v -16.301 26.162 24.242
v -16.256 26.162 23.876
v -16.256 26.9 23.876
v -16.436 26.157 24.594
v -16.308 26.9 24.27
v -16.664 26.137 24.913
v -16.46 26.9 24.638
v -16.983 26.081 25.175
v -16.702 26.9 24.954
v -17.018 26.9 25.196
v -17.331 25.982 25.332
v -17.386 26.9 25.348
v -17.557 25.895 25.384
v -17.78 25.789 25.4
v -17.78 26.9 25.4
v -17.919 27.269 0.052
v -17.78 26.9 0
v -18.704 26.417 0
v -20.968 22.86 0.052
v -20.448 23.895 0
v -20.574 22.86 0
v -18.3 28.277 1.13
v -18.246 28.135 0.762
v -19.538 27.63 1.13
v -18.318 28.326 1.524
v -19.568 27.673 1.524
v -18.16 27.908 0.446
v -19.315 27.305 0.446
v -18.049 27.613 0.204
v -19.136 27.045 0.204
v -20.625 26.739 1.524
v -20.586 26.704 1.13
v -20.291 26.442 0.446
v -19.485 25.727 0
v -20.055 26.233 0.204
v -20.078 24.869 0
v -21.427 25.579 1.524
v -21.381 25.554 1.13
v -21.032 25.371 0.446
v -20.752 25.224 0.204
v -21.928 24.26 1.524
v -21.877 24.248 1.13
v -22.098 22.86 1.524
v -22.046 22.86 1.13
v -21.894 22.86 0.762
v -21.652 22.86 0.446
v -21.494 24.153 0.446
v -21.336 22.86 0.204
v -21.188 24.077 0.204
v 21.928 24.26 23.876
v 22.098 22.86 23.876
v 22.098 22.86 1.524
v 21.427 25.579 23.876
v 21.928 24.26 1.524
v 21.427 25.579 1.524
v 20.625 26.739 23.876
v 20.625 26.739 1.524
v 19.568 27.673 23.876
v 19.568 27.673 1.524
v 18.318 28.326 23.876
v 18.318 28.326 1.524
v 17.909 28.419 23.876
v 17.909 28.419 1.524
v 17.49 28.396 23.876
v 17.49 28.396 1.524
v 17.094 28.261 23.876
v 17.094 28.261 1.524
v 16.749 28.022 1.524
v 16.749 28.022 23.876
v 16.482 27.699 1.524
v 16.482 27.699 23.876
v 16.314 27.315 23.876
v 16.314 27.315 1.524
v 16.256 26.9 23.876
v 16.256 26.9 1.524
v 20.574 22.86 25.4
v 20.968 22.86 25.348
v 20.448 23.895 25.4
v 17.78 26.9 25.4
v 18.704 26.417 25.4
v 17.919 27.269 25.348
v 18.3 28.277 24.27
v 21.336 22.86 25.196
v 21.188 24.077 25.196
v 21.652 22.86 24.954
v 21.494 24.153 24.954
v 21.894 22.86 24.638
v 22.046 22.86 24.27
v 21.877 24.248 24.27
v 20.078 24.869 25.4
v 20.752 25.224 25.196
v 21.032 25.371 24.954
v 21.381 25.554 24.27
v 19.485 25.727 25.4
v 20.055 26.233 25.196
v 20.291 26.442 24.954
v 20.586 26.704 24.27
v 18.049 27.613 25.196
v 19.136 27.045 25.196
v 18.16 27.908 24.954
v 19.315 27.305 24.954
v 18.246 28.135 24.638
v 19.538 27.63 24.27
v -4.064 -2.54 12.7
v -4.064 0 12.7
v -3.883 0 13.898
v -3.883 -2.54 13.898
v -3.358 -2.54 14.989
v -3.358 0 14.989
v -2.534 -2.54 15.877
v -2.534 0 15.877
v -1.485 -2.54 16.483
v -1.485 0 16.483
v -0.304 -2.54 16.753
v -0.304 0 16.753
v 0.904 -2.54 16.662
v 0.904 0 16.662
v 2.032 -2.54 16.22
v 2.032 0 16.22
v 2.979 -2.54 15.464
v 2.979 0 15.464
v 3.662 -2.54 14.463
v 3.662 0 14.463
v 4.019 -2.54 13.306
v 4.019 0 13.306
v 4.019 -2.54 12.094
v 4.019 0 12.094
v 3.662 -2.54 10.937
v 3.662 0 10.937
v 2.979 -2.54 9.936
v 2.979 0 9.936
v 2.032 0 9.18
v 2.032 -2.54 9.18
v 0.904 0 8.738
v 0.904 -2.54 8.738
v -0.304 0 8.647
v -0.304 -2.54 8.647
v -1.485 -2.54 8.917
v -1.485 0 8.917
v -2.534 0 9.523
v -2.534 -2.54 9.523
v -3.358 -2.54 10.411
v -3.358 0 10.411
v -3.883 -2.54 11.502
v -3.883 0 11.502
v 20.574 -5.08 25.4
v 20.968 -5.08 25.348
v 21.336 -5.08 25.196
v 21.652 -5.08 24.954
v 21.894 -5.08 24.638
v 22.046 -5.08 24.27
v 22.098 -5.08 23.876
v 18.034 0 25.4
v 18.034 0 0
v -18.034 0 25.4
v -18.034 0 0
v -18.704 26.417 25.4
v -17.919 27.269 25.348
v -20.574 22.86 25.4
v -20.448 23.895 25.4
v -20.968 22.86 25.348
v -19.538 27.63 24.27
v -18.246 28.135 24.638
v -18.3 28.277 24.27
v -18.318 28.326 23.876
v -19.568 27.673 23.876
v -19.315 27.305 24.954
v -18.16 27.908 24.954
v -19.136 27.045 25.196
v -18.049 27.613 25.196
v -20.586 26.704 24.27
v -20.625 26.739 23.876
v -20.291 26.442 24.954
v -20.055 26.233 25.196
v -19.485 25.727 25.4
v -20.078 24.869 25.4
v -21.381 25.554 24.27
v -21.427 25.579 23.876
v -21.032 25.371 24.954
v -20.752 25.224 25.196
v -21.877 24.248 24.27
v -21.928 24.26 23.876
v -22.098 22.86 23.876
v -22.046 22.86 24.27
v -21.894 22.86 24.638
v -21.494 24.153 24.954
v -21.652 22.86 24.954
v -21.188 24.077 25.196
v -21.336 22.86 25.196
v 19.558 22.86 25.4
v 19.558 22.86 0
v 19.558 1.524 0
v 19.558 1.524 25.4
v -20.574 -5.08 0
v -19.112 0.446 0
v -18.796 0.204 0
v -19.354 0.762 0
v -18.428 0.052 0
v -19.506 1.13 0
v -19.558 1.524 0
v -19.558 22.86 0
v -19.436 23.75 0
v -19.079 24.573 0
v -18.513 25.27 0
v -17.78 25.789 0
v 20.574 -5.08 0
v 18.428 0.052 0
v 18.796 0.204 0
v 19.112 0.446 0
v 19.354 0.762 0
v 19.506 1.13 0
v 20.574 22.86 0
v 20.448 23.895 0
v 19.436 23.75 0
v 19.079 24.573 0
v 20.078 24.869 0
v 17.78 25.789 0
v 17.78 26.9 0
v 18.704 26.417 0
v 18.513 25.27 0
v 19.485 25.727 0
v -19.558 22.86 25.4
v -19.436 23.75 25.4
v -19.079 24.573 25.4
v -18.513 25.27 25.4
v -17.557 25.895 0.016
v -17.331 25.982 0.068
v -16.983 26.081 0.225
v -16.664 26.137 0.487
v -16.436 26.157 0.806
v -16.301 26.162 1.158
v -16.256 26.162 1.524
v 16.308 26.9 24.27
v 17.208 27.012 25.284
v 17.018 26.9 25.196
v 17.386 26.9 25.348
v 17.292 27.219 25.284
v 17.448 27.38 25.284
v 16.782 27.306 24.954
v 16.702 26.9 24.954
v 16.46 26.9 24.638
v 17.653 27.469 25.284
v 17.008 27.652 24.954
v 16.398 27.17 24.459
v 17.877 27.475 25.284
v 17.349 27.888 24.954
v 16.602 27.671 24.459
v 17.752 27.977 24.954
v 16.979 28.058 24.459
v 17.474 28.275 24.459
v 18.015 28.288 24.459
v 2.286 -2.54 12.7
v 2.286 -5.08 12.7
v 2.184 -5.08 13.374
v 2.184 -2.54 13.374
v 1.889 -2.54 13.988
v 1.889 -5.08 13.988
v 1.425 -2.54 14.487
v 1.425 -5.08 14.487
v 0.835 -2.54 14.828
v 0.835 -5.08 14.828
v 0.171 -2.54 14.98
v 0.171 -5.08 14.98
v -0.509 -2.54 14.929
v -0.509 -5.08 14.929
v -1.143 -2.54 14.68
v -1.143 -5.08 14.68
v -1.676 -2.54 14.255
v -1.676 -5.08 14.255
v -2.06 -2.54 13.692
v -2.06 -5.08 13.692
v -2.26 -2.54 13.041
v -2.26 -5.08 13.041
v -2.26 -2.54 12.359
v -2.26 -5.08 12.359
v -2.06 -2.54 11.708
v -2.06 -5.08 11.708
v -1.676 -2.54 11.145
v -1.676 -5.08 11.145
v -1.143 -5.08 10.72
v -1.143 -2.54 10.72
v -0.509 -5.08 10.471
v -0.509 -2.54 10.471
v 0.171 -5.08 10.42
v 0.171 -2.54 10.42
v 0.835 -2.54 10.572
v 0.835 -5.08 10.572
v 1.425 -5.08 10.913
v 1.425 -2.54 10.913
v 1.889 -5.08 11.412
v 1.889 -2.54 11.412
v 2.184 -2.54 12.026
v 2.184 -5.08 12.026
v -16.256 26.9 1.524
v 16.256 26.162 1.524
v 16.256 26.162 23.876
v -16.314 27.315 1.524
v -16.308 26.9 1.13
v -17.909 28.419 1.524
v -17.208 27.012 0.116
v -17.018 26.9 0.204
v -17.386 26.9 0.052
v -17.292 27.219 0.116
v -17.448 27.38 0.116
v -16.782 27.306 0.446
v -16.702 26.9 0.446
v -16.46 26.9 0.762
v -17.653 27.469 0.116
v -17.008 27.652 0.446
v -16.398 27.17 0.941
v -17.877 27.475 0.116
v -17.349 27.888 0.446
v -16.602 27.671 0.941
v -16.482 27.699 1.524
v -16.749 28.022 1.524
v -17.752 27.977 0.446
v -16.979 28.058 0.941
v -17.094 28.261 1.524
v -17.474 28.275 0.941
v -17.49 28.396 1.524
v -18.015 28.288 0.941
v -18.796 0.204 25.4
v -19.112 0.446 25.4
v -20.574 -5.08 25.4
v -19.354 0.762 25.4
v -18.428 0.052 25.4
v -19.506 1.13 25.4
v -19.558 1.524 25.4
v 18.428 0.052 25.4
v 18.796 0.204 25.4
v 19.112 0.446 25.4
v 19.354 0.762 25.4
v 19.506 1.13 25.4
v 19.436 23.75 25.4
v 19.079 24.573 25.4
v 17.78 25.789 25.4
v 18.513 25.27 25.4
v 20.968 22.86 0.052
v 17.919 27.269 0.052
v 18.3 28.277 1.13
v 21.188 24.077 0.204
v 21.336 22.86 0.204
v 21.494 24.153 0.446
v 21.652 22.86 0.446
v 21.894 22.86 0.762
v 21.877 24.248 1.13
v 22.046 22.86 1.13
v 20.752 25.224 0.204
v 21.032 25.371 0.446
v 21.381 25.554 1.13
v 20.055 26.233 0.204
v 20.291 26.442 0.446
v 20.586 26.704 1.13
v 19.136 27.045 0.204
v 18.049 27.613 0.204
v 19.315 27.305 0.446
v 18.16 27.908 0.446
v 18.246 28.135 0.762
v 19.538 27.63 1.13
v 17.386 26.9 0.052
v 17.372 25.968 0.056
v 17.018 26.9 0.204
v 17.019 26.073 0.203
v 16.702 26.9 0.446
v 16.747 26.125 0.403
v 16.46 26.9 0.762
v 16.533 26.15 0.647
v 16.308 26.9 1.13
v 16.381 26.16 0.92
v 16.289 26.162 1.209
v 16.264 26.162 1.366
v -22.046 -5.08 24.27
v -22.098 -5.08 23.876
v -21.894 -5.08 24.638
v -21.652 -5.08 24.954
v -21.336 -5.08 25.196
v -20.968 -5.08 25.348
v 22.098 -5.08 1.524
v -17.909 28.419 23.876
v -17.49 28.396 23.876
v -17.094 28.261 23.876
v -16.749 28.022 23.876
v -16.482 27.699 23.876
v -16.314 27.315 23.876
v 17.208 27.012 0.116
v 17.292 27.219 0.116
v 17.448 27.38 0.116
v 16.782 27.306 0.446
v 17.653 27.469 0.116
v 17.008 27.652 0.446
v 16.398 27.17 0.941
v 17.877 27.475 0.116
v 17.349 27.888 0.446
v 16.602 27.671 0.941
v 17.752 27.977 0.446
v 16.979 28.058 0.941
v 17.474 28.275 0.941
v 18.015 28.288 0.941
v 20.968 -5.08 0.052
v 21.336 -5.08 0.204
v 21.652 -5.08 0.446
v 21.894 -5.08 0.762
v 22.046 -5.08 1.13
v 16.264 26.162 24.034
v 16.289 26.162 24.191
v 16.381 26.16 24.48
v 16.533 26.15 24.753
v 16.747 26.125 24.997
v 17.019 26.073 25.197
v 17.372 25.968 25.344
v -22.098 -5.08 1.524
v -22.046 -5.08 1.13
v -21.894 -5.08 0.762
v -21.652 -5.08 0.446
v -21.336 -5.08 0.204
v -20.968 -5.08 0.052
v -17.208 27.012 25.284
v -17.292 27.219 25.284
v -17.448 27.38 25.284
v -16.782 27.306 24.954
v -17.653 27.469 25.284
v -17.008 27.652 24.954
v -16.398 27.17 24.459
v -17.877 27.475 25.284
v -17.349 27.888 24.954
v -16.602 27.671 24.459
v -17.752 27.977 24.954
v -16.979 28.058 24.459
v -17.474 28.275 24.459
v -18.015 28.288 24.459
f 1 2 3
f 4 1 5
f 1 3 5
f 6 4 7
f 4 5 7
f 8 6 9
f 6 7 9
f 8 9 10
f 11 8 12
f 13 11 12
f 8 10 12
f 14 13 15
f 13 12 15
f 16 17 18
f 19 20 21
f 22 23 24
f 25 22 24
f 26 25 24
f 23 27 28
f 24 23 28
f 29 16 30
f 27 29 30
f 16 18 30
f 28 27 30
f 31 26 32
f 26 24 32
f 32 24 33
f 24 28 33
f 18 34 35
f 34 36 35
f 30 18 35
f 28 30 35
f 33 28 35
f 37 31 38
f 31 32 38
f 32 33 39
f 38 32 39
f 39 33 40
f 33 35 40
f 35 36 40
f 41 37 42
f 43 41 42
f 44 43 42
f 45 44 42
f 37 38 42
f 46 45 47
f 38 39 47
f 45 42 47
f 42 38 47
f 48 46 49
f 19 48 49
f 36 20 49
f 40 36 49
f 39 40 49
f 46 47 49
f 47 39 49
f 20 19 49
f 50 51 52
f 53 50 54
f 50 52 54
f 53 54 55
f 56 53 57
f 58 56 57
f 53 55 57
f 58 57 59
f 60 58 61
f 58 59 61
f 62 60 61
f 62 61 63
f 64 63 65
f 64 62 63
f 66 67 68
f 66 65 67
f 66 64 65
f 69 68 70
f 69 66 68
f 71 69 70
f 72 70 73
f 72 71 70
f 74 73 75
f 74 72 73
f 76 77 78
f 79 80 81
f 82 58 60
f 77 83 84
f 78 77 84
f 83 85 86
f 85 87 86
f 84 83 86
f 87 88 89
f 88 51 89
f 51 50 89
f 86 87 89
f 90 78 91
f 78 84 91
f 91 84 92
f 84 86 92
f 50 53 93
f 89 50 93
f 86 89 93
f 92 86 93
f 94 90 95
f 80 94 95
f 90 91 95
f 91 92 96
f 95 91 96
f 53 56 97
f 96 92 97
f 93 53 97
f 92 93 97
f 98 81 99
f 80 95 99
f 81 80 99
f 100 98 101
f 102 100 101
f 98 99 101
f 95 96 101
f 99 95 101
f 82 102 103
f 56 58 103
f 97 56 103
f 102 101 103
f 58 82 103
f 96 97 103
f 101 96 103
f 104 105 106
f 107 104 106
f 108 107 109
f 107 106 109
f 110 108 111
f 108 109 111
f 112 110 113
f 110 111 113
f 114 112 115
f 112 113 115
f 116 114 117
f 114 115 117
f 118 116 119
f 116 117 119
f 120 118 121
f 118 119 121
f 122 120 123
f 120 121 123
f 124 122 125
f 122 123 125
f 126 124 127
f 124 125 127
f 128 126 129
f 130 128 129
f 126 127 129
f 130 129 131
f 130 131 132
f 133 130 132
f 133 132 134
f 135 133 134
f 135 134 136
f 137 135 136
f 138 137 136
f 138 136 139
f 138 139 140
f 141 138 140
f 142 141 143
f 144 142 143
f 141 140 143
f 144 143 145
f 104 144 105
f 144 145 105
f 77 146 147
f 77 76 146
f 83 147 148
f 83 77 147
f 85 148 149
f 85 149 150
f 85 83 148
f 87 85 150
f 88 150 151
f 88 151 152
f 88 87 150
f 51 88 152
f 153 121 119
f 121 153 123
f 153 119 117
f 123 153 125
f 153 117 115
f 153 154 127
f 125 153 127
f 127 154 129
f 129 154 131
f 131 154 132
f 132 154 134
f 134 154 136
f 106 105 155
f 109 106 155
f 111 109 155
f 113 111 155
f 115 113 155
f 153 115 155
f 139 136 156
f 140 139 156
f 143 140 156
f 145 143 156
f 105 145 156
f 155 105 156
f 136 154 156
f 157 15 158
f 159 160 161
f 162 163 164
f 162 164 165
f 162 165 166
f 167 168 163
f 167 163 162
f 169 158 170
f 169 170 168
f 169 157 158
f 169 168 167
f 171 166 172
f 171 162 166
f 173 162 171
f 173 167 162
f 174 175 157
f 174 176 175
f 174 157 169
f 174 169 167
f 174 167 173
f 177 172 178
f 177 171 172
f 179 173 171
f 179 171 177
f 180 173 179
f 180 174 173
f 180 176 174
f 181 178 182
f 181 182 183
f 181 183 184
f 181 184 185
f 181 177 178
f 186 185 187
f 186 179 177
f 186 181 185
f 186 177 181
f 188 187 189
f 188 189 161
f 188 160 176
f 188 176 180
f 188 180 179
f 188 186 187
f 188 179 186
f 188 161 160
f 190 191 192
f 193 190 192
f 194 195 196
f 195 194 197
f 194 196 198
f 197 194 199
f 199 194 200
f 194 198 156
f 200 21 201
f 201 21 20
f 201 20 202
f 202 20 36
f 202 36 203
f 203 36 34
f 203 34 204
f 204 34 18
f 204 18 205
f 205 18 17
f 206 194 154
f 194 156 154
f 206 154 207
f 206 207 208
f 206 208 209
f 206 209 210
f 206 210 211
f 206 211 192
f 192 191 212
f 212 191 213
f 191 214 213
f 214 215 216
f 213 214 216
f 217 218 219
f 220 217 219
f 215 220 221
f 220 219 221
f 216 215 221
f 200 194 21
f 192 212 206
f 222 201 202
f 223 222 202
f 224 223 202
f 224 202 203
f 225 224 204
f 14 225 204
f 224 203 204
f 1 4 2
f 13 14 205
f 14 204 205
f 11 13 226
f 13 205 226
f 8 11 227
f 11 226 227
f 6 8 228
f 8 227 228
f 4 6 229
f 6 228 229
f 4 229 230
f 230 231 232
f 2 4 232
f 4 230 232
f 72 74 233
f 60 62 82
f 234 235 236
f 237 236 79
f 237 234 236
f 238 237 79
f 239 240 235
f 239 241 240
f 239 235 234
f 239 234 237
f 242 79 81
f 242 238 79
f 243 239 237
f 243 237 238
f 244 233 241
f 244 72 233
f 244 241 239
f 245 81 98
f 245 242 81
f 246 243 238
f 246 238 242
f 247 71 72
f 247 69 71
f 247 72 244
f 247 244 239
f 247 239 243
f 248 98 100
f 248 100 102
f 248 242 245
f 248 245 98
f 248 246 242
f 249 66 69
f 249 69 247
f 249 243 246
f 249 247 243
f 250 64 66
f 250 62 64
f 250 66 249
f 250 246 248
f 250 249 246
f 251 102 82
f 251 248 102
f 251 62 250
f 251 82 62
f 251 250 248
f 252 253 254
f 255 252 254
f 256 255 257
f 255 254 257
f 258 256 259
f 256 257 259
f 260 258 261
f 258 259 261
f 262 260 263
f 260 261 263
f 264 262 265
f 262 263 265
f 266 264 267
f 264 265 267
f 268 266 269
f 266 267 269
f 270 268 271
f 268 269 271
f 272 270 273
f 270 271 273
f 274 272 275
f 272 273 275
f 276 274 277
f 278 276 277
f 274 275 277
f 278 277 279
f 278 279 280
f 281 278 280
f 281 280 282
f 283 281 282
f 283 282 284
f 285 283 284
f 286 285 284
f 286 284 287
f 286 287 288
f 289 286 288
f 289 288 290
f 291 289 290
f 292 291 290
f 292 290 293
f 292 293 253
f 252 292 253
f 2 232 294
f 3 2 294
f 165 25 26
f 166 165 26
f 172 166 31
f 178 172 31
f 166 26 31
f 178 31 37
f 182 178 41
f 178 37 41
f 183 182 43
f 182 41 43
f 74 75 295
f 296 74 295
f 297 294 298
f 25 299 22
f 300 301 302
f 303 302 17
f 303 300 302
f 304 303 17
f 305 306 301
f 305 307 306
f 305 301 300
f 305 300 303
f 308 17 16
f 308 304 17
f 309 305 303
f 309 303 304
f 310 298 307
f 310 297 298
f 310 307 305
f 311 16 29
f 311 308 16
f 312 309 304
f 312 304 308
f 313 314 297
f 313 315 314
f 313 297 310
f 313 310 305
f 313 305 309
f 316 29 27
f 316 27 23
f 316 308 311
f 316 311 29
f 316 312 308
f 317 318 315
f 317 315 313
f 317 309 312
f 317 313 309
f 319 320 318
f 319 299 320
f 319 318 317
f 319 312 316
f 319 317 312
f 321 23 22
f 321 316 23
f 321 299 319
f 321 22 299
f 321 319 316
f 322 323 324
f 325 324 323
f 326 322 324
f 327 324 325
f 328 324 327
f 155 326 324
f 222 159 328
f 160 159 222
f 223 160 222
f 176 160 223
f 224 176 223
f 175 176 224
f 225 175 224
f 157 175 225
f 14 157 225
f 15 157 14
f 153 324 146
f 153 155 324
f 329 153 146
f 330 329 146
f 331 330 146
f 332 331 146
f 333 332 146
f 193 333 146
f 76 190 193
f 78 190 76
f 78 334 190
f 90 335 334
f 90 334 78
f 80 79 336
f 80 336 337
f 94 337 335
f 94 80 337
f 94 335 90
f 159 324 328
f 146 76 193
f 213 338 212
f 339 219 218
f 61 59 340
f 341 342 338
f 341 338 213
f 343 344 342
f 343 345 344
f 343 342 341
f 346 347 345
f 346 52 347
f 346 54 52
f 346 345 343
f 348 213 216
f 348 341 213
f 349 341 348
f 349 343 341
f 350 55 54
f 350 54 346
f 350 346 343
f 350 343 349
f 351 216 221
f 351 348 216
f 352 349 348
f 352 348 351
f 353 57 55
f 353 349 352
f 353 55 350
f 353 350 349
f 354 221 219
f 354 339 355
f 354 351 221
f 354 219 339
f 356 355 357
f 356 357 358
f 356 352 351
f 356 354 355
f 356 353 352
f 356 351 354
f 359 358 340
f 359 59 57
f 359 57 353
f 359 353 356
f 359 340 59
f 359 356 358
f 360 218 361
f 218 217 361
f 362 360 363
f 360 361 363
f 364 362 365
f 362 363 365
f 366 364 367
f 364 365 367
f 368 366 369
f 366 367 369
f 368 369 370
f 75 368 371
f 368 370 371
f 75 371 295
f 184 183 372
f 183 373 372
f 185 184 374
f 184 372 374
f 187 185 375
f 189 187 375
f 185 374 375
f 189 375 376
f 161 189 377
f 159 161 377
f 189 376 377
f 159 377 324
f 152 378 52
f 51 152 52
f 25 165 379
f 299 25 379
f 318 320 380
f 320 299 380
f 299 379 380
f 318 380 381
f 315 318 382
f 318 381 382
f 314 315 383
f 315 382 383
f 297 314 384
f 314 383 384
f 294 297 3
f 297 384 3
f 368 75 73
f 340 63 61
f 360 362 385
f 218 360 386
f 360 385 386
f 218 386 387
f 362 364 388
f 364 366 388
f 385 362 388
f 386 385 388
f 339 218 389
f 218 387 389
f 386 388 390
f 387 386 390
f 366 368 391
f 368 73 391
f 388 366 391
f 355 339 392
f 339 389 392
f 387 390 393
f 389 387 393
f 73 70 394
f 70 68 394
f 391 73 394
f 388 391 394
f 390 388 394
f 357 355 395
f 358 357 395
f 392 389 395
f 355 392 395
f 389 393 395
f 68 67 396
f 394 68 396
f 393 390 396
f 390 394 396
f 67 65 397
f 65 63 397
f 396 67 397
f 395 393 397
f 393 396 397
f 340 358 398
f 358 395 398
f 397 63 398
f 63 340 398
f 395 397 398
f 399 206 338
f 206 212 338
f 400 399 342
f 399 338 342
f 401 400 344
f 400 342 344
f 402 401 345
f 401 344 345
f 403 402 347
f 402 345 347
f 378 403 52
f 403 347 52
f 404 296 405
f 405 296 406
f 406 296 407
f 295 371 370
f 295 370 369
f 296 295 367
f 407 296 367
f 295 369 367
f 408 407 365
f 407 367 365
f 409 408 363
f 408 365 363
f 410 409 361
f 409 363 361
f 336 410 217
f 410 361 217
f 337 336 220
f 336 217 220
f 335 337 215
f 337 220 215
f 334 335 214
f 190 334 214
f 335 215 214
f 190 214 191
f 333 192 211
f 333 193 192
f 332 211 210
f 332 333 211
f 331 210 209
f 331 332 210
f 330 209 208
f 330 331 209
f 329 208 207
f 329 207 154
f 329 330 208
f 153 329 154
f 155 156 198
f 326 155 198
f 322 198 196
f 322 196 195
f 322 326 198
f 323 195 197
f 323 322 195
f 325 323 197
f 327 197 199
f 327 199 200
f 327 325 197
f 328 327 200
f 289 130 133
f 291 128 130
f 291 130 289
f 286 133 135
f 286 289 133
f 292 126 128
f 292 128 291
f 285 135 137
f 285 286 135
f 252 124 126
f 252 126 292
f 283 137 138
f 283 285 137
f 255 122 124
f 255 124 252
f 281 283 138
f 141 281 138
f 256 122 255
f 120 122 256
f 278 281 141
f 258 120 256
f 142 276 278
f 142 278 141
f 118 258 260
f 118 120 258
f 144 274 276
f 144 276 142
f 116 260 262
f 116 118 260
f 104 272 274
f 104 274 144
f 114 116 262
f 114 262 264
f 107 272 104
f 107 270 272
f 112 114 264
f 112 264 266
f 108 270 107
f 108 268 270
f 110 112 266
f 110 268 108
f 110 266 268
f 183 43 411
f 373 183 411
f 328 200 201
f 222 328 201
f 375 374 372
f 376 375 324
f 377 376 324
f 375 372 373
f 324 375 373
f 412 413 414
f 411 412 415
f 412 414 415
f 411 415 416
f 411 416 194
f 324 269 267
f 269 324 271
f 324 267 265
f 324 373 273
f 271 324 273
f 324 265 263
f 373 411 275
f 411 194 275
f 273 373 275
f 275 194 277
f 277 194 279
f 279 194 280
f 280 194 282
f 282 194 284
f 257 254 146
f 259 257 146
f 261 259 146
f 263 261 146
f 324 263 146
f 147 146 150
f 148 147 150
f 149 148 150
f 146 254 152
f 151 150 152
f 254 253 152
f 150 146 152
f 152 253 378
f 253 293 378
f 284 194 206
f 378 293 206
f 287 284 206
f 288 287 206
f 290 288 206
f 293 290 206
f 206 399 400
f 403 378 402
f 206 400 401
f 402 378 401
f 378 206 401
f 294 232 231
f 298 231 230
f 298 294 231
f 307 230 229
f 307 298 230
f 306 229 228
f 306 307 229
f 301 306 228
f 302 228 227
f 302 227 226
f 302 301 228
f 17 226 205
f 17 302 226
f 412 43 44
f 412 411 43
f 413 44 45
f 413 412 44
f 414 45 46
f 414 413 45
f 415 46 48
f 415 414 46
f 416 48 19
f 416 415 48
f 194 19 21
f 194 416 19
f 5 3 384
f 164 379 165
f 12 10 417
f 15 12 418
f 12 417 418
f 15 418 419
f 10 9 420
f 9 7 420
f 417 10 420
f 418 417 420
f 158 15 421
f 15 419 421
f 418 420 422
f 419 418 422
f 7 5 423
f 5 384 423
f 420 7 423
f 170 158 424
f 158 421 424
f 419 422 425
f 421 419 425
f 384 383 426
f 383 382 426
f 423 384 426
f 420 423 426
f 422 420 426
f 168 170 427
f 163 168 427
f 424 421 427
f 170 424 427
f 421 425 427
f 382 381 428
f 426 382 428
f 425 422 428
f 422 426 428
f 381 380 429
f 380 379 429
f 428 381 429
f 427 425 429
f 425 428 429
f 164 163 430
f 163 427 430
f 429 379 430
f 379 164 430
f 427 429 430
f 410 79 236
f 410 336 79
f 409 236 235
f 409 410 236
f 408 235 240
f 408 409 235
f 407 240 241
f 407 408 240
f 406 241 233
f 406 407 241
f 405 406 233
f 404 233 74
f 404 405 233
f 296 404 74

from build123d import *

# Parameters (mm, degrees)
F1_DEPTH = 25.4
F2_R     = 2.286
F3_DEPTH = 5.08
F4_R     = 4.064
F5_DEPTH = 2.54
F6_R     = 1.524


with BuildPart() as f1:
    # F0 (on Top) → F1 (new body)
    with BuildSketch(Plane.XY):
        with BuildLine():
            ThreePointArc((-16.256, 28.702), (-20.386918, 26.990918), (-22.098, 22.86))
            Line((-22.098, 22.86), (-22.098, -5.08))
            Line((-22.098, -5.08), (22.098, -5.08))
            Line((22.098, -5.08), (22.098, 22.86))
            ThreePointArc((22.098, 22.86), (20.386918, 26.990918), (16.256, 28.702))
            Line((16.256, 28.702), (16.256, 26.162))
            ThreePointArc((16.256, 26.162), (18.590867, 25.194867), (19.558, 22.86))
            Line((19.558, 22.86), (19.558, 0))
            Line((19.558, 0), (-19.558, 0))
            Line((-19.558, 0), (-19.558, 22.86))
            ThreePointArc((-19.558, 22.86), (-18.590867, 25.194867), (-16.256, 26.162))
            Line((-16.256, 26.162), (-16.256, 28.702))
        make_face()
    extrude(amount=F1_DEPTH)

    # F2 (on face) → F3 (cut, through all)
    with BuildSketch(Plane.XZ.offset(5.08)):
        with Locations((0, 12.7)):
            Circle(F2_R)
    extrude(amount=-F3_DEPTH, mode=Mode.SUBTRACT)

    # F4 (on face) → F5 (cut)
    with BuildSketch(Plane(origin=(0, 0, 0), x_dir=(-1, 0, 0), z_dir=(0, 1, 0))):
        with Locations((0, 12.7)):
            Circle(F4_R)
    extrude(amount=-F5_DEPTH, mode=Mode.SUBTRACT)

    # F6
    f6_edges = [f1.edges().sort_by_distance(p)[0] for p in [
        (-20.386918, 26.990918, 25.4),
        (20.386918, 26.990918, 25.4),
        (20.386918, 26.990918, 0),
        (-22.098, 8.89, 0),
        (-19.558, 0, 12.7),
        (19.558, 0, 12.7),
        (-16.256, 28.702, 12.7),
        (16.256, 28.702, 12.7),
        (-16.256, 27.432, 25.4),
        (16.256, 27.432, 25.4),
        (16.256, 27.432, 0),
        (-16.256, 27.432, 0),
    ]]
    fillet(f6_edges, radius=F6_R)


solid = f1.part
